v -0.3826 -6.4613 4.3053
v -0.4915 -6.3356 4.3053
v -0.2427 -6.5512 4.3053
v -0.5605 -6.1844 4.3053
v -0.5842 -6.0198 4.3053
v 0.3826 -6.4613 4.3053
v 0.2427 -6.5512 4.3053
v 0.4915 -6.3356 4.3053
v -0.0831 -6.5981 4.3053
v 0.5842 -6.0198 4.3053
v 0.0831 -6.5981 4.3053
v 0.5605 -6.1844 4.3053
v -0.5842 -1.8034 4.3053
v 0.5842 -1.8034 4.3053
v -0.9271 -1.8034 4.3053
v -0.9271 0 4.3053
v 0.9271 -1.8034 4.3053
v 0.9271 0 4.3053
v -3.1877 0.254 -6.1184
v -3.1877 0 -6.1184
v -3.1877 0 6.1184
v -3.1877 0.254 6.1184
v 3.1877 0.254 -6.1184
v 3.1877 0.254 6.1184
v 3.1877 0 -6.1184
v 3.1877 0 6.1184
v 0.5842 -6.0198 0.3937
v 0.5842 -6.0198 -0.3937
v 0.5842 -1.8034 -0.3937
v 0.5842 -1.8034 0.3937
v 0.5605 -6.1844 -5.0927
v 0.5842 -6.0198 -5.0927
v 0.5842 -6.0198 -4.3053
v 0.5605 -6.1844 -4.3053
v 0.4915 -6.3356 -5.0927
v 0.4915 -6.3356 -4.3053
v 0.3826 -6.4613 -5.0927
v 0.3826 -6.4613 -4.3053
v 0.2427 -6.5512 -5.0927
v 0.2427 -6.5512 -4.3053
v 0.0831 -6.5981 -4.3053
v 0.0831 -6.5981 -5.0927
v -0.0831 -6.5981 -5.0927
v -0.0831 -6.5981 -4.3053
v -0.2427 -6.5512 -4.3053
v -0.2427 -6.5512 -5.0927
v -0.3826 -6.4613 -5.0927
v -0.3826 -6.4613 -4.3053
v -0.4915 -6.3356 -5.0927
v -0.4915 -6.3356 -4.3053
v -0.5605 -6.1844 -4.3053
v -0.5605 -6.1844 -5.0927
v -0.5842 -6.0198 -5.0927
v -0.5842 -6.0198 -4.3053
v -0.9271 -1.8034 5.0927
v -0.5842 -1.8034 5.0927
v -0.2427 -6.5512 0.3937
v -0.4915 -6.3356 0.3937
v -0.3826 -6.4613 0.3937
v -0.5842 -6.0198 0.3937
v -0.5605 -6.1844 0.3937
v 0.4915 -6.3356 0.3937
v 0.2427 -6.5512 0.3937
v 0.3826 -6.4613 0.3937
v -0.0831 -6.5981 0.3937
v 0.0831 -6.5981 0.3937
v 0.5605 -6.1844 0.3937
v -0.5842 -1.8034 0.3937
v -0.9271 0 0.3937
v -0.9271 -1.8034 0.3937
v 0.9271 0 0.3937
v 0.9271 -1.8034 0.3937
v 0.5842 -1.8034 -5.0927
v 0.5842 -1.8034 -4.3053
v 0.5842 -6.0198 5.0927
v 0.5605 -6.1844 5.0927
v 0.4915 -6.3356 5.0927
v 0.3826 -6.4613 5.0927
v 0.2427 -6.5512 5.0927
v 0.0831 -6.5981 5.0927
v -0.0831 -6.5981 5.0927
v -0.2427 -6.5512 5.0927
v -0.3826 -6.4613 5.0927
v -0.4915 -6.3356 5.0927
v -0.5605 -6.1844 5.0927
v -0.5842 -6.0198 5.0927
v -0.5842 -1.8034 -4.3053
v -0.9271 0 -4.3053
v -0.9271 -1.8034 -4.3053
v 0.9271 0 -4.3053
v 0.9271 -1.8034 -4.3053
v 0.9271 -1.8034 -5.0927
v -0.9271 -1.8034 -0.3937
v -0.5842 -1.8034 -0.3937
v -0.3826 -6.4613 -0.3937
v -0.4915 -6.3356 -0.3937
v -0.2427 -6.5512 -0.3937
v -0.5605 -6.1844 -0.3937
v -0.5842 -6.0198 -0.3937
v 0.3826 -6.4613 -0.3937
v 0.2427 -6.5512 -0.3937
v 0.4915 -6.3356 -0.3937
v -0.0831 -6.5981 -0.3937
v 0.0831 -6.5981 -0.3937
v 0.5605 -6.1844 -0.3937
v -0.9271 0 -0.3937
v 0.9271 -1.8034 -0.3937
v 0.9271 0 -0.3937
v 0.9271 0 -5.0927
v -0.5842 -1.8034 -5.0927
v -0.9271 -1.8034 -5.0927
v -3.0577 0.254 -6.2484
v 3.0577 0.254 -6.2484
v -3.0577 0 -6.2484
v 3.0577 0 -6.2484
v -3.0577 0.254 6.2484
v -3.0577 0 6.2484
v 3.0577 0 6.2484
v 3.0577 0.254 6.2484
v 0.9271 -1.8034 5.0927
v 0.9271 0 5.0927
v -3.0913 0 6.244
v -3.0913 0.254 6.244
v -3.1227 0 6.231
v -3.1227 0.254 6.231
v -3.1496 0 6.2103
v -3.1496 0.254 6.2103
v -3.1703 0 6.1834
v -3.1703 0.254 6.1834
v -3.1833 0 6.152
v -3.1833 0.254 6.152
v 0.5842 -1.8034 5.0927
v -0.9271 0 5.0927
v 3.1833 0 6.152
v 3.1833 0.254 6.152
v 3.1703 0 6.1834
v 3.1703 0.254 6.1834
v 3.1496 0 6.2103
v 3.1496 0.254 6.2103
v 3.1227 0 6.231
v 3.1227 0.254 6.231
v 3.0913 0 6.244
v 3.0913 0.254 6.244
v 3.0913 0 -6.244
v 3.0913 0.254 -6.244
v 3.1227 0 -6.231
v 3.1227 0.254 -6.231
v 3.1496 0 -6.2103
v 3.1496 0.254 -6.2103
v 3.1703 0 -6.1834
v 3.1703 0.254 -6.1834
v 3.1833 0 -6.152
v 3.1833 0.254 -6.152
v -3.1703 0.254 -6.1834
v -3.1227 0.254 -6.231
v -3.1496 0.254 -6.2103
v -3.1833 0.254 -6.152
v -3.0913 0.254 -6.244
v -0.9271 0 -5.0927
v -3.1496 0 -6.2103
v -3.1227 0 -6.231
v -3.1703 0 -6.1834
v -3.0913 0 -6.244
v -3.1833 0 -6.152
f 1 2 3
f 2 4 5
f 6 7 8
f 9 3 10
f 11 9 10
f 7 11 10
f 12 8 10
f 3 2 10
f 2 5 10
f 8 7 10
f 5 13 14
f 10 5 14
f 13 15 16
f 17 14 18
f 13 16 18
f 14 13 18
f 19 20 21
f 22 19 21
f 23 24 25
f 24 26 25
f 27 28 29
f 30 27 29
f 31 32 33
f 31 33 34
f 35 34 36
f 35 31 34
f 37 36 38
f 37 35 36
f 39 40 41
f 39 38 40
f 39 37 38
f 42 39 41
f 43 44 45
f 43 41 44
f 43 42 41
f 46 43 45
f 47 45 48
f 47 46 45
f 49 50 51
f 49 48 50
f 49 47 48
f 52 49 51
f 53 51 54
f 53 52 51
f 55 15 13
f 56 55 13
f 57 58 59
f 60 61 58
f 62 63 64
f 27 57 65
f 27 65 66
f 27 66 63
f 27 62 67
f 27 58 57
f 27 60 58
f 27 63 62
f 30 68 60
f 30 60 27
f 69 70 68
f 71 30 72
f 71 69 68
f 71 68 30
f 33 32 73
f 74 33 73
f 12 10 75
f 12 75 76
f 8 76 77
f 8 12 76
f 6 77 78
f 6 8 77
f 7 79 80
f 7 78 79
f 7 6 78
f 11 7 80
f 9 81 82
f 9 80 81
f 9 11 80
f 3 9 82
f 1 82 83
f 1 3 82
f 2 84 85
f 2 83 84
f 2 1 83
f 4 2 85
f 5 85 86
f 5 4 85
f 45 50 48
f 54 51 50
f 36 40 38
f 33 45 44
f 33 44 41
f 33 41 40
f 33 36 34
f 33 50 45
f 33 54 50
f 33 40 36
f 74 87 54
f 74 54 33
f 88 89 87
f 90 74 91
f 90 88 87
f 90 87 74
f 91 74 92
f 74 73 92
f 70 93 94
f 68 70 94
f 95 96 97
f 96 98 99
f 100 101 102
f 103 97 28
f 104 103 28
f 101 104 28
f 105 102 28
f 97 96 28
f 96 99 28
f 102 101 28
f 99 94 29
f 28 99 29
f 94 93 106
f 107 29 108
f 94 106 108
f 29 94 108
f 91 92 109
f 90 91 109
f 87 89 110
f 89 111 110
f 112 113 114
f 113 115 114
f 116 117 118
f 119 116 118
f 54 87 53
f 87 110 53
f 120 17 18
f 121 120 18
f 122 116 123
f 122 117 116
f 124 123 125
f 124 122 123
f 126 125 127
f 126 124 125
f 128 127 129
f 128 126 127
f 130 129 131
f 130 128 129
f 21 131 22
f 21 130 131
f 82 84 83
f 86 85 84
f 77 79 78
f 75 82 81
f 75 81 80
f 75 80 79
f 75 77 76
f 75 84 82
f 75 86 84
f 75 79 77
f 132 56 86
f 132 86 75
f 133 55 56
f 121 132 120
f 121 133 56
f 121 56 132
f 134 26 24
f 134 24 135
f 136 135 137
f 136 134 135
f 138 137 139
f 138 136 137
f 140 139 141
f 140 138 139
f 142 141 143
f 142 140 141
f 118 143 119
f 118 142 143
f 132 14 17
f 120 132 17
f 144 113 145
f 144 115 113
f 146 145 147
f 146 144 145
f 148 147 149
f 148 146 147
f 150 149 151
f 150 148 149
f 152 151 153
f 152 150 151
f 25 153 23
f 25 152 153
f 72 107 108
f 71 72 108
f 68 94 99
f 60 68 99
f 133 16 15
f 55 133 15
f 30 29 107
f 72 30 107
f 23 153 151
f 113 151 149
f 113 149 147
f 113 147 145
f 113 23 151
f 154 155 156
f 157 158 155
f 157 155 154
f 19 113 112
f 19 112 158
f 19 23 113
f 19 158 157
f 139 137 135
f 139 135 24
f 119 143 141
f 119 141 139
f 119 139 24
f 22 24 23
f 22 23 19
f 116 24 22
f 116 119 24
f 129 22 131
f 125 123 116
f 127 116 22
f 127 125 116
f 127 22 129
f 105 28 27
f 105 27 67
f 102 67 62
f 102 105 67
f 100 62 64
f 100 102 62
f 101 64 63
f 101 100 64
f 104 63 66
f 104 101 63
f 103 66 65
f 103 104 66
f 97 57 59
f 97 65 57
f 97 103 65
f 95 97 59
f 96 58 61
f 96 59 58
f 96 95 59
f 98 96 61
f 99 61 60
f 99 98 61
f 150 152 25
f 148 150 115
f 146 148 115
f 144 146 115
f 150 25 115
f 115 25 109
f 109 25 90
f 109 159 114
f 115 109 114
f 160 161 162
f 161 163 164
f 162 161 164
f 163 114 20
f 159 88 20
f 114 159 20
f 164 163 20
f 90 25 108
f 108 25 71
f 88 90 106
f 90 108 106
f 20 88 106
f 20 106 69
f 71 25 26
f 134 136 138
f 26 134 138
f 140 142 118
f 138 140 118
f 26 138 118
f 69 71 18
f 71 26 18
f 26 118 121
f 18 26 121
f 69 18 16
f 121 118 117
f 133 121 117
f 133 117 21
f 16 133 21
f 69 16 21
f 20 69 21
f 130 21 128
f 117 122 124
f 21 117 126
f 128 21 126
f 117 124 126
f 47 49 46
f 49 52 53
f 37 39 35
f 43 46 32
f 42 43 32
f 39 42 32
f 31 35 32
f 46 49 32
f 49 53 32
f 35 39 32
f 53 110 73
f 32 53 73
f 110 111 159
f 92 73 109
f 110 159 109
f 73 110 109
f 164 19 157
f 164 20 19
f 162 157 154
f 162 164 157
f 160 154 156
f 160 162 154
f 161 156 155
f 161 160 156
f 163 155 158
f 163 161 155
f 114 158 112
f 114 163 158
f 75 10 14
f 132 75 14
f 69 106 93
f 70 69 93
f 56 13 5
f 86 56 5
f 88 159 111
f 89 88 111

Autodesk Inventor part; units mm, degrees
sketch "Sketch_2" plane through (0, 0, 0) normal (0, 1, 0) x (-1, 0, 0)
  line L0 (3.1877, -6.1184) -> (3.1877, 6.1184)
  arc A0 (3.1877, 6.1184) -> (3.0577, 6.2484) centre (3.0577, 6.1184) ccw
  line L1 (3.0577, 6.2484) -> (-3.0577, 6.2484)
  arc A1 (-3.0577, 6.2484) -> (-3.1877, 6.1184) centre (-3.0577, 6.1184) ccw
  line L2 (-3.1877, 6.1184) -> (-3.1877, -6.1184)
  arc A2 (-3.1877, -6.1184) -> (-3.0577, -6.2484) centre (-3.0577, -6.1184) ccw
  line L3 (-3.0577, -6.2484) -> (3.0577, -6.2484)
  arc A3 (3.0577, -6.2484) -> (3.1877, -6.1184) centre (3.0577, -6.1184) ccw
extrude "Extrusion1" add sketch "Sketch_2" along normal blind 0.254
sketch "Sketch_7" plane through (0, 0, -4.699) normal (0, 0, 1) x (1, 0, 0)
  line L0 (-0.9271, 0) -> (-0.9271, -1.8034)
  line L1 (-0.9271, -1.8034) -> (-0.5842, -1.8034)
  line L2 (-0.5842, -1.8034) -> (-0.5842, -6.0198)
  arc A0 (-0.5842, -6.0198) -> (0.5842, -6.0198) centre (0, -6.0198) ccw
  line L3 (0.5842, -6.0198) -> (0.5842, -1.8034)
  line L4 (0.5842, -1.8034) -> (0.9271, -1.8034)
  line L5 (0.9271, -1.8034) -> (0.9271, 0)
  line L6 (0.9271, 0) -> (-0.9271, 0)
extrude "Extrusion2" add sketch "Sketch_7" along normal mid plane 0.7874
pattern_linear "Rectangular Pattern1" count 3 spacing 4.699 along (0, 0, 1) of "Extrusion2"
ref_plane "to_base_XY" through (0, 0, 0) normal (0, 1, 0) x (1, 0, 0)
ref_plane "to_base_YZ" through (0, 0, 0) normal (1, 0, 0) x (0, 0, -1)
ref_plane "to_base_ZX" through (0, 0, 0) normal (0, 0, -1) x (0, 1, 0)
properties part number "M201503-terminals"
